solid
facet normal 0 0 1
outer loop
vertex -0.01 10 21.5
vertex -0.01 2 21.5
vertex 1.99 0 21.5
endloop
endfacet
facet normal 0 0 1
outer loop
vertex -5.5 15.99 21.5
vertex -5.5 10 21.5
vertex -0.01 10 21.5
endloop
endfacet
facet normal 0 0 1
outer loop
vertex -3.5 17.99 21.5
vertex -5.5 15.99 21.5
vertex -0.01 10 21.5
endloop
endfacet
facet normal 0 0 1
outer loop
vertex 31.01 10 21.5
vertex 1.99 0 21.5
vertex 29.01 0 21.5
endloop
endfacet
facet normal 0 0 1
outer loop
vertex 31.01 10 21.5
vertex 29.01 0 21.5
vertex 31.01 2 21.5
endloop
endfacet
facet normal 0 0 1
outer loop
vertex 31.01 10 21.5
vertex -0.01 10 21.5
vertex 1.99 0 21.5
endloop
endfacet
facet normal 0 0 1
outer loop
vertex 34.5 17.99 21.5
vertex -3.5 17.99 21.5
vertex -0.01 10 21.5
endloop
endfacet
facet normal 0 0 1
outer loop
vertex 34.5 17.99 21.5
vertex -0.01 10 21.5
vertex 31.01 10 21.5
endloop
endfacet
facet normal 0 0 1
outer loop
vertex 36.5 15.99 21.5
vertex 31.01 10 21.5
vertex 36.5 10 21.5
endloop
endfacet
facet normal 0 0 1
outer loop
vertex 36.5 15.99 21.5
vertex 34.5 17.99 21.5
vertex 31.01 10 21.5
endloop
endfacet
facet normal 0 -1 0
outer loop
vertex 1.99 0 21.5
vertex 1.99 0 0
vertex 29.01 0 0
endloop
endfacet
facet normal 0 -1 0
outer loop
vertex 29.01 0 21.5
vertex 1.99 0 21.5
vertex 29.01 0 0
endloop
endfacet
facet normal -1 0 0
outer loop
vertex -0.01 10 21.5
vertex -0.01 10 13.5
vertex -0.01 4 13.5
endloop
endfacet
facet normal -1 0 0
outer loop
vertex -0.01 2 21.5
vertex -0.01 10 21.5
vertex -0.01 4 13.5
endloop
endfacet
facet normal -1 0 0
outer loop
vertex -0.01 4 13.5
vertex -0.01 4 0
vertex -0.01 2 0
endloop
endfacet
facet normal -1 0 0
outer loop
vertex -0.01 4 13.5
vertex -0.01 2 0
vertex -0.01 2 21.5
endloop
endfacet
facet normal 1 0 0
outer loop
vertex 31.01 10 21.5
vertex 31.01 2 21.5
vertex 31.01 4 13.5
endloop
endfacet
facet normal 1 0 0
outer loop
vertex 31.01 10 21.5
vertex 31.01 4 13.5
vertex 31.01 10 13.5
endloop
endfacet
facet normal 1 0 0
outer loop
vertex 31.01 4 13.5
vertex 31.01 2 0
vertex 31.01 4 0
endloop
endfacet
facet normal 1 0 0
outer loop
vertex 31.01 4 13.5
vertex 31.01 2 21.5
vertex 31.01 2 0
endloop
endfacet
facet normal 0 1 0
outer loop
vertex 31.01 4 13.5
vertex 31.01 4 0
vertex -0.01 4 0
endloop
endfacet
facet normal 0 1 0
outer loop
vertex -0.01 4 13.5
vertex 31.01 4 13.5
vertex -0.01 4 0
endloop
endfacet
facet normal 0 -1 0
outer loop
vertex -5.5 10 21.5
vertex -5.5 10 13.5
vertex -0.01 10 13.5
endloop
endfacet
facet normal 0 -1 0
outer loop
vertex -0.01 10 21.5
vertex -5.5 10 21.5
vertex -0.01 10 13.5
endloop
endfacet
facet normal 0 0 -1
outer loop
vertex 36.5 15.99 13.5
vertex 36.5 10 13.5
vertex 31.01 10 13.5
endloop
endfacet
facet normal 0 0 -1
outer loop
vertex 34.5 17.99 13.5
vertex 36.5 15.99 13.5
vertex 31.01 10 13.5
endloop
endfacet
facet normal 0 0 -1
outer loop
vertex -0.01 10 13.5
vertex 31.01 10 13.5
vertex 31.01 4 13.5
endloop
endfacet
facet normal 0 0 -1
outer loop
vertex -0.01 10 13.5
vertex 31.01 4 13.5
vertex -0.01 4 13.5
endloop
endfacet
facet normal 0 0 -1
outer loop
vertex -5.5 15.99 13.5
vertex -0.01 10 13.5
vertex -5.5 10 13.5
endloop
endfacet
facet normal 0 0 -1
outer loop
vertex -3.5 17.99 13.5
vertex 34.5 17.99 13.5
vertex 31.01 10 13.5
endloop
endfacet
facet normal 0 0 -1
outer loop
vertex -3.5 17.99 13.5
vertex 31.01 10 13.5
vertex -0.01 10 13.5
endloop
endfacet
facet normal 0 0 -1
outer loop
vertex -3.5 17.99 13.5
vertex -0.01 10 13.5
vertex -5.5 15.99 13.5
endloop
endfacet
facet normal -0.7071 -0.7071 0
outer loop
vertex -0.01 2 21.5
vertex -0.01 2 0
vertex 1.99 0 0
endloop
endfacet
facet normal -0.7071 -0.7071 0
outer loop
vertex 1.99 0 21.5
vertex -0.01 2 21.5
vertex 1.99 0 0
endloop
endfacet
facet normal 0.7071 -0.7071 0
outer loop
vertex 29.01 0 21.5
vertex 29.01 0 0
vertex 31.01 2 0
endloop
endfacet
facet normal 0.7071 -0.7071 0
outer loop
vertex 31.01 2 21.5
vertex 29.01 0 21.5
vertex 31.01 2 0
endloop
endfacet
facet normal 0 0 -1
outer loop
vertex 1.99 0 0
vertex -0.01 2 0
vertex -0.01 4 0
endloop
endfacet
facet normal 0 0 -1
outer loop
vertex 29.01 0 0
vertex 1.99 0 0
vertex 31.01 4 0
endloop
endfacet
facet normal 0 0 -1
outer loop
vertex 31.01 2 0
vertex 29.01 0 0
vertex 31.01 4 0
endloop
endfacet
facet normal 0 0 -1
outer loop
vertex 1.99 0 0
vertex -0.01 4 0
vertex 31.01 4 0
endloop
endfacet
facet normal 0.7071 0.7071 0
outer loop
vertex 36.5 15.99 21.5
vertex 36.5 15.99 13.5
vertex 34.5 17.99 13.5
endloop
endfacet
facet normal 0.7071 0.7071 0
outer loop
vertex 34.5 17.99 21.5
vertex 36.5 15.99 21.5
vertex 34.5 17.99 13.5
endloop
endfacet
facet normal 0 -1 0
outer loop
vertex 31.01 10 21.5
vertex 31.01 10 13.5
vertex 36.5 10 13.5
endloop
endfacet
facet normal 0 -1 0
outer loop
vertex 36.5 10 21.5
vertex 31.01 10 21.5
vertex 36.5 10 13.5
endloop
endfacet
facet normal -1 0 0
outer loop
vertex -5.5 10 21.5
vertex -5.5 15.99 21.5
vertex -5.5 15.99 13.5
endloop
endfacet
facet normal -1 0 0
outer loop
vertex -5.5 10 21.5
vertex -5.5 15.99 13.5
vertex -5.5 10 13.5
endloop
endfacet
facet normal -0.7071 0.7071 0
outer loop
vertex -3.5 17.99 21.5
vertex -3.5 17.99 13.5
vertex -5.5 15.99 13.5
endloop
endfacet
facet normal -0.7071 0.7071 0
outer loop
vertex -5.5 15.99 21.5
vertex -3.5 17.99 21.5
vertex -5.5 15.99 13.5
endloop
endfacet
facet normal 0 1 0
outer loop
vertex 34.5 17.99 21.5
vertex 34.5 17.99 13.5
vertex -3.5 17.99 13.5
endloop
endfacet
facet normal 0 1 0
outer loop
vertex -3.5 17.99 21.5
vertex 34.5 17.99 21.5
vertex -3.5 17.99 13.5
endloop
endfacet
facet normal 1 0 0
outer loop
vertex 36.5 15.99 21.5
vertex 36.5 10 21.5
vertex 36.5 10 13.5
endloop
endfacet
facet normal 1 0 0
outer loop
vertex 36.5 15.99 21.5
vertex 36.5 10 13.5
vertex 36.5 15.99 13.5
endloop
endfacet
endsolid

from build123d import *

# Parameters (mm, degrees)
EXTRUDE_1_DEPTH     = 21.5
SKETCH_2_W          = 43.373604633
SKETCH_2_H          = 16.611508938
CUT_EXTRUDE_1_DEPTH = 13.5


with BuildPart() as part:
    # Эскиз1 → Вытянуть1 (new body)
    with BuildSketch(Plane.XY):
        Polygon((-0.0095286, 2), (1.9904714, 0), (29.0095286, 0), (31.0095286, 2), (31.0095286, 10), (36.5, 10), (36.5, 15.9904714), (34.5, 17.9904714), (-3.5, 17.9904714), (-5.5, 15.9904714), (-5.5, 10), (-0.0095286, 10), align=None)
    extrude(amount=EXTRUDE_1_DEPTH)

    # Эскиз2 → Вырез-Вытянуть1 (cut)
    with BuildSketch(Plane(origin=(0, 0, 0), x_dir=(-1, 0, 0), z_dir=(0, 0, -1))):
        with Locations((-15.469303829, 12.305754469)):
            Rectangle(SKETCH_2_W, SKETCH_2_H)
    extrude(amount=-CUT_EXTRUDE_1_DEPTH, mode=Mode.SUBTRACT)


solid = part.part
